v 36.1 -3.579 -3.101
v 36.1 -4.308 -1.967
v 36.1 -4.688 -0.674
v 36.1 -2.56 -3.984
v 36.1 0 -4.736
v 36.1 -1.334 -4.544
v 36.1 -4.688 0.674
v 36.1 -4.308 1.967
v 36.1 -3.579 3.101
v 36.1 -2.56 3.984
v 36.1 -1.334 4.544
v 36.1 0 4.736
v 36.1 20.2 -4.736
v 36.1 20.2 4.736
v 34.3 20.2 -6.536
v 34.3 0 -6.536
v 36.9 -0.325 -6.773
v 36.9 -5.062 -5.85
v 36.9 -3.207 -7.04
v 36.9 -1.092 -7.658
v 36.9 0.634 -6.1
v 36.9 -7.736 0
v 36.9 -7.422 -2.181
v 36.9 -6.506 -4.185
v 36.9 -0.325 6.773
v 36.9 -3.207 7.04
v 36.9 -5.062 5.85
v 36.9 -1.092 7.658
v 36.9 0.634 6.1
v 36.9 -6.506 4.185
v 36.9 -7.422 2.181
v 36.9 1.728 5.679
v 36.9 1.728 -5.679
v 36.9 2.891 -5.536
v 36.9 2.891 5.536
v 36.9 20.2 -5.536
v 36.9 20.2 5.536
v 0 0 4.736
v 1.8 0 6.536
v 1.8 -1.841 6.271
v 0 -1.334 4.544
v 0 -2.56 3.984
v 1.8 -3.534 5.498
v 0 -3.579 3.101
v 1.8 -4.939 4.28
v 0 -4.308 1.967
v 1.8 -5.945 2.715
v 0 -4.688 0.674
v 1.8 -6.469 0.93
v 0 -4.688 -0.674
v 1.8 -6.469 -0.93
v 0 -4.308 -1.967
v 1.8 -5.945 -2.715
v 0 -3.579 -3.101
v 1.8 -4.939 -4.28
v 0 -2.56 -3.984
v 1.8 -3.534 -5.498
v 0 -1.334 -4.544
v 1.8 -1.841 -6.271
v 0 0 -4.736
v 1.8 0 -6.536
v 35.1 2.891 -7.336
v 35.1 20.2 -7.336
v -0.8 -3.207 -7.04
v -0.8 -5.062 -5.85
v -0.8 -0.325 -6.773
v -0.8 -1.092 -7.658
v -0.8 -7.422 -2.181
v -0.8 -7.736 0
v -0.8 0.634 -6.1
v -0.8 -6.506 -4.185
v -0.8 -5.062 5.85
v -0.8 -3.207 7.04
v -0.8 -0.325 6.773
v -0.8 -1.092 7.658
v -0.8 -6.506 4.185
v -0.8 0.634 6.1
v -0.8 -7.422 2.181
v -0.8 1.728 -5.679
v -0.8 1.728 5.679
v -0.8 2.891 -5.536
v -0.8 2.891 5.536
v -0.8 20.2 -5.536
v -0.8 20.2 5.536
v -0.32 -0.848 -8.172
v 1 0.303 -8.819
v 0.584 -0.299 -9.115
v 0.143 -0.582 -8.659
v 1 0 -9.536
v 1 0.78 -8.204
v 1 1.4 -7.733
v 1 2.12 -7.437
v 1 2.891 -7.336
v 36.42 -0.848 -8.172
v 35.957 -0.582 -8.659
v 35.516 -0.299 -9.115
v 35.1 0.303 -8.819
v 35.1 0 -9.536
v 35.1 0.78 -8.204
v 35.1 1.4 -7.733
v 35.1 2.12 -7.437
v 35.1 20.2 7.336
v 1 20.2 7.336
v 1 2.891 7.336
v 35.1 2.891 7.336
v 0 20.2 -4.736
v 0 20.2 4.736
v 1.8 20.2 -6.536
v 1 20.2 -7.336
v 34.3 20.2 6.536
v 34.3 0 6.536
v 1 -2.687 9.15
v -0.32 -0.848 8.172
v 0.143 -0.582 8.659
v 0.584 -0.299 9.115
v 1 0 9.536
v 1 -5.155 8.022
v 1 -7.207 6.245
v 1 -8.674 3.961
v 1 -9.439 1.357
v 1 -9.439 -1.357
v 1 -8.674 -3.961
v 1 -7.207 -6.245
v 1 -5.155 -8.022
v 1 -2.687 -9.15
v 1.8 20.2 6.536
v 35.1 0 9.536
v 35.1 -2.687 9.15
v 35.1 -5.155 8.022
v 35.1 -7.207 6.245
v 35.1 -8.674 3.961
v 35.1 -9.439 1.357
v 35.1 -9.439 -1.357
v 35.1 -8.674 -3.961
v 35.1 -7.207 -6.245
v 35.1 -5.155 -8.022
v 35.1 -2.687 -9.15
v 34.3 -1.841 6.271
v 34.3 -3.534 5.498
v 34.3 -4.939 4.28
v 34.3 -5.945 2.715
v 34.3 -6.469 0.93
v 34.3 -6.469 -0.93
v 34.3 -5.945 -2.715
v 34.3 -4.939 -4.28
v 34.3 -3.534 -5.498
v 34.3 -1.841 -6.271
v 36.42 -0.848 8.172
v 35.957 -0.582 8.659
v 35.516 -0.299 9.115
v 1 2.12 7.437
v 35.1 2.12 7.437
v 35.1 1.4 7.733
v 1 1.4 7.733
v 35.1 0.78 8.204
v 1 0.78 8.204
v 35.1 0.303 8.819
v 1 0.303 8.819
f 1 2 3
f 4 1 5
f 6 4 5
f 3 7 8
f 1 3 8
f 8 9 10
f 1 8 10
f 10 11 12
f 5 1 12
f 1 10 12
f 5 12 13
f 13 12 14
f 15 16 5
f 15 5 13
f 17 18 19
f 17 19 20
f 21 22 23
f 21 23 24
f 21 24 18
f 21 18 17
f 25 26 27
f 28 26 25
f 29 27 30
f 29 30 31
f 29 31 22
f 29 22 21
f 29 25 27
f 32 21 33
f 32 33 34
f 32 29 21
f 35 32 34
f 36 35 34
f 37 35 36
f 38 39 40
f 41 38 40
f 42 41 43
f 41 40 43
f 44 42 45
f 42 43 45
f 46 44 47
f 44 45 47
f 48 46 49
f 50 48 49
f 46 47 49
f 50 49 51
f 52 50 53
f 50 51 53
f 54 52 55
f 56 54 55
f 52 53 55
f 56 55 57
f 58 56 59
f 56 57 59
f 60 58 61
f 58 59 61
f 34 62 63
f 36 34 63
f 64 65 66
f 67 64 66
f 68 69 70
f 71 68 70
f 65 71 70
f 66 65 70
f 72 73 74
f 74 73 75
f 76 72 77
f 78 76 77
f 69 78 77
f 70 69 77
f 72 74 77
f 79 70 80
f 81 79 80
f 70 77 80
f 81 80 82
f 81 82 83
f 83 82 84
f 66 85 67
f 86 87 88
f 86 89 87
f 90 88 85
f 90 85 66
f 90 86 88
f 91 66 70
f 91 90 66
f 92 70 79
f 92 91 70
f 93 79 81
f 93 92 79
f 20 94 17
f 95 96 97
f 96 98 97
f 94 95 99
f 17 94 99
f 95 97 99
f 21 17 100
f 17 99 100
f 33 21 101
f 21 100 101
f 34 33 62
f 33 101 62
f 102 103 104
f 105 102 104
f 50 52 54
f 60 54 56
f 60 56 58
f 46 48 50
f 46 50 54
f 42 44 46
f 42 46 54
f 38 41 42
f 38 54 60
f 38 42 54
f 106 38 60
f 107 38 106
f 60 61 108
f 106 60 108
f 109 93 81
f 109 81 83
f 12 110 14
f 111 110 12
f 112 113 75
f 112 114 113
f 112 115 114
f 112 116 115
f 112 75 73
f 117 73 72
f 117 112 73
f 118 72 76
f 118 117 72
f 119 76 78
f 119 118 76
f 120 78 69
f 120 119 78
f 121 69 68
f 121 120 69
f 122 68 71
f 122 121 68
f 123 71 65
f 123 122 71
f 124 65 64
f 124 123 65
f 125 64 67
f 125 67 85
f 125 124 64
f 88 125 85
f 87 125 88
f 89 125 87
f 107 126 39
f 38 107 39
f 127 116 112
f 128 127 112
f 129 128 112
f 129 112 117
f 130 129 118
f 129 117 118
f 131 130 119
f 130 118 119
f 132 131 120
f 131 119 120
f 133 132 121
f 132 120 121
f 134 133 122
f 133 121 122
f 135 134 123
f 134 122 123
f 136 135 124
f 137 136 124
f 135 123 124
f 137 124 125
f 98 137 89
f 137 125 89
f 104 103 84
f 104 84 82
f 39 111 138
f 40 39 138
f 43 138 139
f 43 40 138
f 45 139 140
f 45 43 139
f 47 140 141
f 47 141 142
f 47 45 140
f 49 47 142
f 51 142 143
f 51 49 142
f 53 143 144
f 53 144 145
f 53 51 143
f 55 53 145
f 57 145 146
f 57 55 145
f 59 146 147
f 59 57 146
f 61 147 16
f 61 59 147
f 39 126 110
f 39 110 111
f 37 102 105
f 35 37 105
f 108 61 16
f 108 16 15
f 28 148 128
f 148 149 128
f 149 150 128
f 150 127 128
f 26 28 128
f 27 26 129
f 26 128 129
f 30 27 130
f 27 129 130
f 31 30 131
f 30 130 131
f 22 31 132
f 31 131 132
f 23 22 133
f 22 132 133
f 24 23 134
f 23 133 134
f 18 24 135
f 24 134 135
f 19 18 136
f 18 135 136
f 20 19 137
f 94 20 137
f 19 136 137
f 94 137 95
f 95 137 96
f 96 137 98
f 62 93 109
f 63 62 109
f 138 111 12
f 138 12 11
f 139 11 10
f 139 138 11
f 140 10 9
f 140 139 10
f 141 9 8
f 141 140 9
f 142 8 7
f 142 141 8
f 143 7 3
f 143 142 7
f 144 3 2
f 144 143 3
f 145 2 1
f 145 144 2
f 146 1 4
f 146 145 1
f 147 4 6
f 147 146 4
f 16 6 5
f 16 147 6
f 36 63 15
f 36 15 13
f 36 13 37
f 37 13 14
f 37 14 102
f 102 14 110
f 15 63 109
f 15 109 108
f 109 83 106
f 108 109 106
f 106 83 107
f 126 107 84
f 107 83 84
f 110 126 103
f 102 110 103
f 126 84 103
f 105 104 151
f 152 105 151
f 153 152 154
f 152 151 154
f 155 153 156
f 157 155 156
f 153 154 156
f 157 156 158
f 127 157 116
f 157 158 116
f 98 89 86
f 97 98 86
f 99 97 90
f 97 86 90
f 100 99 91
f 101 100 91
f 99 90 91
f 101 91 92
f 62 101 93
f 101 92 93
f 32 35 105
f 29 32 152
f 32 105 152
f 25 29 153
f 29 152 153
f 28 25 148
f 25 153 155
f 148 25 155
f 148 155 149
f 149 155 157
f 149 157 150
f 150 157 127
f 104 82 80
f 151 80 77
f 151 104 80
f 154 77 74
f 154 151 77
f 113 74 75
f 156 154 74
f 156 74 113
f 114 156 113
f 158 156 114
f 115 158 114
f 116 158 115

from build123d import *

# Parameters (mm, degrees)
F4_DEPTH      = 0.8
F4_DEPTH_BACK = 36.9
F5_DEPTH      = 36.1
F6_T1_DEPTH   = 37.7
F7_SIZE       = 1.8
F8_SIZE       = 1.8


# Not quite as in the source:
# - a fillet or chamfer that OpenCascade refuses, or shapes differently, is made with other operations: its cross-section is extruded or revolved along the edge and cut away or added


with BuildPart() as f4:
    # F3 (on Right) → F4 (new body, two sides)
    with BuildSketch(Plane.YZ) as f4_sk:
        with BuildLine():
            Line((20.2, 6.5358882766), (0, 6.5358882766))
            ThreePointArc((0, 6.5358882766), (-6.5358882766, 0), (0, -6.5358882766))
            Line((0, -6.5358882766), (20.2, -6.5358882766))
            Line((20.2, -6.5358882766), (20.2, 6.5358882766))
        make_face()
        with BuildLine():
            ThreePointArc((0, -6.5358882766), (-6.5358882766, 0), (0, 6.5358882766))
            Line((0, 6.5358882766), (20.2, 6.5358882766))
            Line((20.2, 6.5358882766), (20.2, 7.3358882766))
            Line((20.2, 7.3358882766), (0, 7.3358882766))
            Line((0, 7.3358882766), (0, 9.5358882766))
            ThreePointArc((0, 9.5358882766), (-9.5358882766, 0), (0, -9.5358882766))
            Line((0, -9.5358882766), (0, -7.3358882766))
            Line((0, -7.3358882766), (20.2, -7.3358882766))
            Line((20.2, -7.3358882766), (20.2, -6.5358882766))
            Line((20.2, -6.5358882766), (0, -6.5358882766))
        make_face()
    extrude(amount=-F4_DEPTH)
    extrude(f4_sk.sketch, amount=F4_DEPTH_BACK)

    # F3 (on Right) → F5 (cut)
    with BuildSketch(Plane.YZ):
        with BuildLine():
            Line((20.2, 6.5358882766), (0, 6.5358882766))
            ThreePointArc((0, 6.5358882766), (-6.5358882766, 0), (0, -6.5358882766))
            Line((0, -6.5358882766), (20.2, -6.5358882766))
            Line((20.2, -6.5358882766), (20.2, 6.5358882766))
        make_face()
    extrude(amount=F5_DEPTH, mode=Mode.SUBTRACT)

    # F6: fillet of radius 3 on 2 edges, made by hand

    # F6_s2 → F6_t1 (join)
    with BuildSketch(Plane.YZ.offset(-0.8)):
        with BuildLine():
            ThreePointArc((2.891366459, 7.3358882766), (1.0747762465, 7.9484209993), (0, 9.5358882766))
            Line((0, 9.5358882766), (0, 7.3358882766))
            Line((0, 7.3358882766), (2.891366459, 7.3358882766))
        make_face()
        with BuildLine():
            ThreePointArc((0, -9.5358882766), (1.0747762465, -7.9484209993), (2.891366459, -7.3358882766))
            Line((2.891366459, -7.3358882766), (0, -7.3358882766))
            Line((0, -7.3358882766), (0, -9.5358882766))
        make_face()
    extrude(amount=F6_T1_DEPTH)

    # F7
    f7_edges = [f4.edges().sort_by_distance(p)[0] for p in [
        (36.1, 10.1, 6.535888),
        (0, -6.535888, 0),
    ]]
    chamfer(f7_edges, length=F7_SIZE)

    # F8
    f8_edges = [f4.edges().sort_by_distance(p)[0] for p in [
        (36.9, 11.545683, 7.335888),
        (36.9, 1.074776, 7.948421),
        (36.9, -9.535888, 0),
        (36.9, 1.074776, -7.948421),
        (36.9, 11.545683, -7.335888),
        (-0.8, 11.545683, 7.335888),
        (-0.8, 1.074776, 7.948421),
        (-0.8, -9.535888, 0),
        (-0.8, 1.074776, -7.948421),
        (-0.8, 11.545683, -7.335888),
    ]]
    chamfer(f8_edges, length=F8_SIZE)


solid = f4.part
